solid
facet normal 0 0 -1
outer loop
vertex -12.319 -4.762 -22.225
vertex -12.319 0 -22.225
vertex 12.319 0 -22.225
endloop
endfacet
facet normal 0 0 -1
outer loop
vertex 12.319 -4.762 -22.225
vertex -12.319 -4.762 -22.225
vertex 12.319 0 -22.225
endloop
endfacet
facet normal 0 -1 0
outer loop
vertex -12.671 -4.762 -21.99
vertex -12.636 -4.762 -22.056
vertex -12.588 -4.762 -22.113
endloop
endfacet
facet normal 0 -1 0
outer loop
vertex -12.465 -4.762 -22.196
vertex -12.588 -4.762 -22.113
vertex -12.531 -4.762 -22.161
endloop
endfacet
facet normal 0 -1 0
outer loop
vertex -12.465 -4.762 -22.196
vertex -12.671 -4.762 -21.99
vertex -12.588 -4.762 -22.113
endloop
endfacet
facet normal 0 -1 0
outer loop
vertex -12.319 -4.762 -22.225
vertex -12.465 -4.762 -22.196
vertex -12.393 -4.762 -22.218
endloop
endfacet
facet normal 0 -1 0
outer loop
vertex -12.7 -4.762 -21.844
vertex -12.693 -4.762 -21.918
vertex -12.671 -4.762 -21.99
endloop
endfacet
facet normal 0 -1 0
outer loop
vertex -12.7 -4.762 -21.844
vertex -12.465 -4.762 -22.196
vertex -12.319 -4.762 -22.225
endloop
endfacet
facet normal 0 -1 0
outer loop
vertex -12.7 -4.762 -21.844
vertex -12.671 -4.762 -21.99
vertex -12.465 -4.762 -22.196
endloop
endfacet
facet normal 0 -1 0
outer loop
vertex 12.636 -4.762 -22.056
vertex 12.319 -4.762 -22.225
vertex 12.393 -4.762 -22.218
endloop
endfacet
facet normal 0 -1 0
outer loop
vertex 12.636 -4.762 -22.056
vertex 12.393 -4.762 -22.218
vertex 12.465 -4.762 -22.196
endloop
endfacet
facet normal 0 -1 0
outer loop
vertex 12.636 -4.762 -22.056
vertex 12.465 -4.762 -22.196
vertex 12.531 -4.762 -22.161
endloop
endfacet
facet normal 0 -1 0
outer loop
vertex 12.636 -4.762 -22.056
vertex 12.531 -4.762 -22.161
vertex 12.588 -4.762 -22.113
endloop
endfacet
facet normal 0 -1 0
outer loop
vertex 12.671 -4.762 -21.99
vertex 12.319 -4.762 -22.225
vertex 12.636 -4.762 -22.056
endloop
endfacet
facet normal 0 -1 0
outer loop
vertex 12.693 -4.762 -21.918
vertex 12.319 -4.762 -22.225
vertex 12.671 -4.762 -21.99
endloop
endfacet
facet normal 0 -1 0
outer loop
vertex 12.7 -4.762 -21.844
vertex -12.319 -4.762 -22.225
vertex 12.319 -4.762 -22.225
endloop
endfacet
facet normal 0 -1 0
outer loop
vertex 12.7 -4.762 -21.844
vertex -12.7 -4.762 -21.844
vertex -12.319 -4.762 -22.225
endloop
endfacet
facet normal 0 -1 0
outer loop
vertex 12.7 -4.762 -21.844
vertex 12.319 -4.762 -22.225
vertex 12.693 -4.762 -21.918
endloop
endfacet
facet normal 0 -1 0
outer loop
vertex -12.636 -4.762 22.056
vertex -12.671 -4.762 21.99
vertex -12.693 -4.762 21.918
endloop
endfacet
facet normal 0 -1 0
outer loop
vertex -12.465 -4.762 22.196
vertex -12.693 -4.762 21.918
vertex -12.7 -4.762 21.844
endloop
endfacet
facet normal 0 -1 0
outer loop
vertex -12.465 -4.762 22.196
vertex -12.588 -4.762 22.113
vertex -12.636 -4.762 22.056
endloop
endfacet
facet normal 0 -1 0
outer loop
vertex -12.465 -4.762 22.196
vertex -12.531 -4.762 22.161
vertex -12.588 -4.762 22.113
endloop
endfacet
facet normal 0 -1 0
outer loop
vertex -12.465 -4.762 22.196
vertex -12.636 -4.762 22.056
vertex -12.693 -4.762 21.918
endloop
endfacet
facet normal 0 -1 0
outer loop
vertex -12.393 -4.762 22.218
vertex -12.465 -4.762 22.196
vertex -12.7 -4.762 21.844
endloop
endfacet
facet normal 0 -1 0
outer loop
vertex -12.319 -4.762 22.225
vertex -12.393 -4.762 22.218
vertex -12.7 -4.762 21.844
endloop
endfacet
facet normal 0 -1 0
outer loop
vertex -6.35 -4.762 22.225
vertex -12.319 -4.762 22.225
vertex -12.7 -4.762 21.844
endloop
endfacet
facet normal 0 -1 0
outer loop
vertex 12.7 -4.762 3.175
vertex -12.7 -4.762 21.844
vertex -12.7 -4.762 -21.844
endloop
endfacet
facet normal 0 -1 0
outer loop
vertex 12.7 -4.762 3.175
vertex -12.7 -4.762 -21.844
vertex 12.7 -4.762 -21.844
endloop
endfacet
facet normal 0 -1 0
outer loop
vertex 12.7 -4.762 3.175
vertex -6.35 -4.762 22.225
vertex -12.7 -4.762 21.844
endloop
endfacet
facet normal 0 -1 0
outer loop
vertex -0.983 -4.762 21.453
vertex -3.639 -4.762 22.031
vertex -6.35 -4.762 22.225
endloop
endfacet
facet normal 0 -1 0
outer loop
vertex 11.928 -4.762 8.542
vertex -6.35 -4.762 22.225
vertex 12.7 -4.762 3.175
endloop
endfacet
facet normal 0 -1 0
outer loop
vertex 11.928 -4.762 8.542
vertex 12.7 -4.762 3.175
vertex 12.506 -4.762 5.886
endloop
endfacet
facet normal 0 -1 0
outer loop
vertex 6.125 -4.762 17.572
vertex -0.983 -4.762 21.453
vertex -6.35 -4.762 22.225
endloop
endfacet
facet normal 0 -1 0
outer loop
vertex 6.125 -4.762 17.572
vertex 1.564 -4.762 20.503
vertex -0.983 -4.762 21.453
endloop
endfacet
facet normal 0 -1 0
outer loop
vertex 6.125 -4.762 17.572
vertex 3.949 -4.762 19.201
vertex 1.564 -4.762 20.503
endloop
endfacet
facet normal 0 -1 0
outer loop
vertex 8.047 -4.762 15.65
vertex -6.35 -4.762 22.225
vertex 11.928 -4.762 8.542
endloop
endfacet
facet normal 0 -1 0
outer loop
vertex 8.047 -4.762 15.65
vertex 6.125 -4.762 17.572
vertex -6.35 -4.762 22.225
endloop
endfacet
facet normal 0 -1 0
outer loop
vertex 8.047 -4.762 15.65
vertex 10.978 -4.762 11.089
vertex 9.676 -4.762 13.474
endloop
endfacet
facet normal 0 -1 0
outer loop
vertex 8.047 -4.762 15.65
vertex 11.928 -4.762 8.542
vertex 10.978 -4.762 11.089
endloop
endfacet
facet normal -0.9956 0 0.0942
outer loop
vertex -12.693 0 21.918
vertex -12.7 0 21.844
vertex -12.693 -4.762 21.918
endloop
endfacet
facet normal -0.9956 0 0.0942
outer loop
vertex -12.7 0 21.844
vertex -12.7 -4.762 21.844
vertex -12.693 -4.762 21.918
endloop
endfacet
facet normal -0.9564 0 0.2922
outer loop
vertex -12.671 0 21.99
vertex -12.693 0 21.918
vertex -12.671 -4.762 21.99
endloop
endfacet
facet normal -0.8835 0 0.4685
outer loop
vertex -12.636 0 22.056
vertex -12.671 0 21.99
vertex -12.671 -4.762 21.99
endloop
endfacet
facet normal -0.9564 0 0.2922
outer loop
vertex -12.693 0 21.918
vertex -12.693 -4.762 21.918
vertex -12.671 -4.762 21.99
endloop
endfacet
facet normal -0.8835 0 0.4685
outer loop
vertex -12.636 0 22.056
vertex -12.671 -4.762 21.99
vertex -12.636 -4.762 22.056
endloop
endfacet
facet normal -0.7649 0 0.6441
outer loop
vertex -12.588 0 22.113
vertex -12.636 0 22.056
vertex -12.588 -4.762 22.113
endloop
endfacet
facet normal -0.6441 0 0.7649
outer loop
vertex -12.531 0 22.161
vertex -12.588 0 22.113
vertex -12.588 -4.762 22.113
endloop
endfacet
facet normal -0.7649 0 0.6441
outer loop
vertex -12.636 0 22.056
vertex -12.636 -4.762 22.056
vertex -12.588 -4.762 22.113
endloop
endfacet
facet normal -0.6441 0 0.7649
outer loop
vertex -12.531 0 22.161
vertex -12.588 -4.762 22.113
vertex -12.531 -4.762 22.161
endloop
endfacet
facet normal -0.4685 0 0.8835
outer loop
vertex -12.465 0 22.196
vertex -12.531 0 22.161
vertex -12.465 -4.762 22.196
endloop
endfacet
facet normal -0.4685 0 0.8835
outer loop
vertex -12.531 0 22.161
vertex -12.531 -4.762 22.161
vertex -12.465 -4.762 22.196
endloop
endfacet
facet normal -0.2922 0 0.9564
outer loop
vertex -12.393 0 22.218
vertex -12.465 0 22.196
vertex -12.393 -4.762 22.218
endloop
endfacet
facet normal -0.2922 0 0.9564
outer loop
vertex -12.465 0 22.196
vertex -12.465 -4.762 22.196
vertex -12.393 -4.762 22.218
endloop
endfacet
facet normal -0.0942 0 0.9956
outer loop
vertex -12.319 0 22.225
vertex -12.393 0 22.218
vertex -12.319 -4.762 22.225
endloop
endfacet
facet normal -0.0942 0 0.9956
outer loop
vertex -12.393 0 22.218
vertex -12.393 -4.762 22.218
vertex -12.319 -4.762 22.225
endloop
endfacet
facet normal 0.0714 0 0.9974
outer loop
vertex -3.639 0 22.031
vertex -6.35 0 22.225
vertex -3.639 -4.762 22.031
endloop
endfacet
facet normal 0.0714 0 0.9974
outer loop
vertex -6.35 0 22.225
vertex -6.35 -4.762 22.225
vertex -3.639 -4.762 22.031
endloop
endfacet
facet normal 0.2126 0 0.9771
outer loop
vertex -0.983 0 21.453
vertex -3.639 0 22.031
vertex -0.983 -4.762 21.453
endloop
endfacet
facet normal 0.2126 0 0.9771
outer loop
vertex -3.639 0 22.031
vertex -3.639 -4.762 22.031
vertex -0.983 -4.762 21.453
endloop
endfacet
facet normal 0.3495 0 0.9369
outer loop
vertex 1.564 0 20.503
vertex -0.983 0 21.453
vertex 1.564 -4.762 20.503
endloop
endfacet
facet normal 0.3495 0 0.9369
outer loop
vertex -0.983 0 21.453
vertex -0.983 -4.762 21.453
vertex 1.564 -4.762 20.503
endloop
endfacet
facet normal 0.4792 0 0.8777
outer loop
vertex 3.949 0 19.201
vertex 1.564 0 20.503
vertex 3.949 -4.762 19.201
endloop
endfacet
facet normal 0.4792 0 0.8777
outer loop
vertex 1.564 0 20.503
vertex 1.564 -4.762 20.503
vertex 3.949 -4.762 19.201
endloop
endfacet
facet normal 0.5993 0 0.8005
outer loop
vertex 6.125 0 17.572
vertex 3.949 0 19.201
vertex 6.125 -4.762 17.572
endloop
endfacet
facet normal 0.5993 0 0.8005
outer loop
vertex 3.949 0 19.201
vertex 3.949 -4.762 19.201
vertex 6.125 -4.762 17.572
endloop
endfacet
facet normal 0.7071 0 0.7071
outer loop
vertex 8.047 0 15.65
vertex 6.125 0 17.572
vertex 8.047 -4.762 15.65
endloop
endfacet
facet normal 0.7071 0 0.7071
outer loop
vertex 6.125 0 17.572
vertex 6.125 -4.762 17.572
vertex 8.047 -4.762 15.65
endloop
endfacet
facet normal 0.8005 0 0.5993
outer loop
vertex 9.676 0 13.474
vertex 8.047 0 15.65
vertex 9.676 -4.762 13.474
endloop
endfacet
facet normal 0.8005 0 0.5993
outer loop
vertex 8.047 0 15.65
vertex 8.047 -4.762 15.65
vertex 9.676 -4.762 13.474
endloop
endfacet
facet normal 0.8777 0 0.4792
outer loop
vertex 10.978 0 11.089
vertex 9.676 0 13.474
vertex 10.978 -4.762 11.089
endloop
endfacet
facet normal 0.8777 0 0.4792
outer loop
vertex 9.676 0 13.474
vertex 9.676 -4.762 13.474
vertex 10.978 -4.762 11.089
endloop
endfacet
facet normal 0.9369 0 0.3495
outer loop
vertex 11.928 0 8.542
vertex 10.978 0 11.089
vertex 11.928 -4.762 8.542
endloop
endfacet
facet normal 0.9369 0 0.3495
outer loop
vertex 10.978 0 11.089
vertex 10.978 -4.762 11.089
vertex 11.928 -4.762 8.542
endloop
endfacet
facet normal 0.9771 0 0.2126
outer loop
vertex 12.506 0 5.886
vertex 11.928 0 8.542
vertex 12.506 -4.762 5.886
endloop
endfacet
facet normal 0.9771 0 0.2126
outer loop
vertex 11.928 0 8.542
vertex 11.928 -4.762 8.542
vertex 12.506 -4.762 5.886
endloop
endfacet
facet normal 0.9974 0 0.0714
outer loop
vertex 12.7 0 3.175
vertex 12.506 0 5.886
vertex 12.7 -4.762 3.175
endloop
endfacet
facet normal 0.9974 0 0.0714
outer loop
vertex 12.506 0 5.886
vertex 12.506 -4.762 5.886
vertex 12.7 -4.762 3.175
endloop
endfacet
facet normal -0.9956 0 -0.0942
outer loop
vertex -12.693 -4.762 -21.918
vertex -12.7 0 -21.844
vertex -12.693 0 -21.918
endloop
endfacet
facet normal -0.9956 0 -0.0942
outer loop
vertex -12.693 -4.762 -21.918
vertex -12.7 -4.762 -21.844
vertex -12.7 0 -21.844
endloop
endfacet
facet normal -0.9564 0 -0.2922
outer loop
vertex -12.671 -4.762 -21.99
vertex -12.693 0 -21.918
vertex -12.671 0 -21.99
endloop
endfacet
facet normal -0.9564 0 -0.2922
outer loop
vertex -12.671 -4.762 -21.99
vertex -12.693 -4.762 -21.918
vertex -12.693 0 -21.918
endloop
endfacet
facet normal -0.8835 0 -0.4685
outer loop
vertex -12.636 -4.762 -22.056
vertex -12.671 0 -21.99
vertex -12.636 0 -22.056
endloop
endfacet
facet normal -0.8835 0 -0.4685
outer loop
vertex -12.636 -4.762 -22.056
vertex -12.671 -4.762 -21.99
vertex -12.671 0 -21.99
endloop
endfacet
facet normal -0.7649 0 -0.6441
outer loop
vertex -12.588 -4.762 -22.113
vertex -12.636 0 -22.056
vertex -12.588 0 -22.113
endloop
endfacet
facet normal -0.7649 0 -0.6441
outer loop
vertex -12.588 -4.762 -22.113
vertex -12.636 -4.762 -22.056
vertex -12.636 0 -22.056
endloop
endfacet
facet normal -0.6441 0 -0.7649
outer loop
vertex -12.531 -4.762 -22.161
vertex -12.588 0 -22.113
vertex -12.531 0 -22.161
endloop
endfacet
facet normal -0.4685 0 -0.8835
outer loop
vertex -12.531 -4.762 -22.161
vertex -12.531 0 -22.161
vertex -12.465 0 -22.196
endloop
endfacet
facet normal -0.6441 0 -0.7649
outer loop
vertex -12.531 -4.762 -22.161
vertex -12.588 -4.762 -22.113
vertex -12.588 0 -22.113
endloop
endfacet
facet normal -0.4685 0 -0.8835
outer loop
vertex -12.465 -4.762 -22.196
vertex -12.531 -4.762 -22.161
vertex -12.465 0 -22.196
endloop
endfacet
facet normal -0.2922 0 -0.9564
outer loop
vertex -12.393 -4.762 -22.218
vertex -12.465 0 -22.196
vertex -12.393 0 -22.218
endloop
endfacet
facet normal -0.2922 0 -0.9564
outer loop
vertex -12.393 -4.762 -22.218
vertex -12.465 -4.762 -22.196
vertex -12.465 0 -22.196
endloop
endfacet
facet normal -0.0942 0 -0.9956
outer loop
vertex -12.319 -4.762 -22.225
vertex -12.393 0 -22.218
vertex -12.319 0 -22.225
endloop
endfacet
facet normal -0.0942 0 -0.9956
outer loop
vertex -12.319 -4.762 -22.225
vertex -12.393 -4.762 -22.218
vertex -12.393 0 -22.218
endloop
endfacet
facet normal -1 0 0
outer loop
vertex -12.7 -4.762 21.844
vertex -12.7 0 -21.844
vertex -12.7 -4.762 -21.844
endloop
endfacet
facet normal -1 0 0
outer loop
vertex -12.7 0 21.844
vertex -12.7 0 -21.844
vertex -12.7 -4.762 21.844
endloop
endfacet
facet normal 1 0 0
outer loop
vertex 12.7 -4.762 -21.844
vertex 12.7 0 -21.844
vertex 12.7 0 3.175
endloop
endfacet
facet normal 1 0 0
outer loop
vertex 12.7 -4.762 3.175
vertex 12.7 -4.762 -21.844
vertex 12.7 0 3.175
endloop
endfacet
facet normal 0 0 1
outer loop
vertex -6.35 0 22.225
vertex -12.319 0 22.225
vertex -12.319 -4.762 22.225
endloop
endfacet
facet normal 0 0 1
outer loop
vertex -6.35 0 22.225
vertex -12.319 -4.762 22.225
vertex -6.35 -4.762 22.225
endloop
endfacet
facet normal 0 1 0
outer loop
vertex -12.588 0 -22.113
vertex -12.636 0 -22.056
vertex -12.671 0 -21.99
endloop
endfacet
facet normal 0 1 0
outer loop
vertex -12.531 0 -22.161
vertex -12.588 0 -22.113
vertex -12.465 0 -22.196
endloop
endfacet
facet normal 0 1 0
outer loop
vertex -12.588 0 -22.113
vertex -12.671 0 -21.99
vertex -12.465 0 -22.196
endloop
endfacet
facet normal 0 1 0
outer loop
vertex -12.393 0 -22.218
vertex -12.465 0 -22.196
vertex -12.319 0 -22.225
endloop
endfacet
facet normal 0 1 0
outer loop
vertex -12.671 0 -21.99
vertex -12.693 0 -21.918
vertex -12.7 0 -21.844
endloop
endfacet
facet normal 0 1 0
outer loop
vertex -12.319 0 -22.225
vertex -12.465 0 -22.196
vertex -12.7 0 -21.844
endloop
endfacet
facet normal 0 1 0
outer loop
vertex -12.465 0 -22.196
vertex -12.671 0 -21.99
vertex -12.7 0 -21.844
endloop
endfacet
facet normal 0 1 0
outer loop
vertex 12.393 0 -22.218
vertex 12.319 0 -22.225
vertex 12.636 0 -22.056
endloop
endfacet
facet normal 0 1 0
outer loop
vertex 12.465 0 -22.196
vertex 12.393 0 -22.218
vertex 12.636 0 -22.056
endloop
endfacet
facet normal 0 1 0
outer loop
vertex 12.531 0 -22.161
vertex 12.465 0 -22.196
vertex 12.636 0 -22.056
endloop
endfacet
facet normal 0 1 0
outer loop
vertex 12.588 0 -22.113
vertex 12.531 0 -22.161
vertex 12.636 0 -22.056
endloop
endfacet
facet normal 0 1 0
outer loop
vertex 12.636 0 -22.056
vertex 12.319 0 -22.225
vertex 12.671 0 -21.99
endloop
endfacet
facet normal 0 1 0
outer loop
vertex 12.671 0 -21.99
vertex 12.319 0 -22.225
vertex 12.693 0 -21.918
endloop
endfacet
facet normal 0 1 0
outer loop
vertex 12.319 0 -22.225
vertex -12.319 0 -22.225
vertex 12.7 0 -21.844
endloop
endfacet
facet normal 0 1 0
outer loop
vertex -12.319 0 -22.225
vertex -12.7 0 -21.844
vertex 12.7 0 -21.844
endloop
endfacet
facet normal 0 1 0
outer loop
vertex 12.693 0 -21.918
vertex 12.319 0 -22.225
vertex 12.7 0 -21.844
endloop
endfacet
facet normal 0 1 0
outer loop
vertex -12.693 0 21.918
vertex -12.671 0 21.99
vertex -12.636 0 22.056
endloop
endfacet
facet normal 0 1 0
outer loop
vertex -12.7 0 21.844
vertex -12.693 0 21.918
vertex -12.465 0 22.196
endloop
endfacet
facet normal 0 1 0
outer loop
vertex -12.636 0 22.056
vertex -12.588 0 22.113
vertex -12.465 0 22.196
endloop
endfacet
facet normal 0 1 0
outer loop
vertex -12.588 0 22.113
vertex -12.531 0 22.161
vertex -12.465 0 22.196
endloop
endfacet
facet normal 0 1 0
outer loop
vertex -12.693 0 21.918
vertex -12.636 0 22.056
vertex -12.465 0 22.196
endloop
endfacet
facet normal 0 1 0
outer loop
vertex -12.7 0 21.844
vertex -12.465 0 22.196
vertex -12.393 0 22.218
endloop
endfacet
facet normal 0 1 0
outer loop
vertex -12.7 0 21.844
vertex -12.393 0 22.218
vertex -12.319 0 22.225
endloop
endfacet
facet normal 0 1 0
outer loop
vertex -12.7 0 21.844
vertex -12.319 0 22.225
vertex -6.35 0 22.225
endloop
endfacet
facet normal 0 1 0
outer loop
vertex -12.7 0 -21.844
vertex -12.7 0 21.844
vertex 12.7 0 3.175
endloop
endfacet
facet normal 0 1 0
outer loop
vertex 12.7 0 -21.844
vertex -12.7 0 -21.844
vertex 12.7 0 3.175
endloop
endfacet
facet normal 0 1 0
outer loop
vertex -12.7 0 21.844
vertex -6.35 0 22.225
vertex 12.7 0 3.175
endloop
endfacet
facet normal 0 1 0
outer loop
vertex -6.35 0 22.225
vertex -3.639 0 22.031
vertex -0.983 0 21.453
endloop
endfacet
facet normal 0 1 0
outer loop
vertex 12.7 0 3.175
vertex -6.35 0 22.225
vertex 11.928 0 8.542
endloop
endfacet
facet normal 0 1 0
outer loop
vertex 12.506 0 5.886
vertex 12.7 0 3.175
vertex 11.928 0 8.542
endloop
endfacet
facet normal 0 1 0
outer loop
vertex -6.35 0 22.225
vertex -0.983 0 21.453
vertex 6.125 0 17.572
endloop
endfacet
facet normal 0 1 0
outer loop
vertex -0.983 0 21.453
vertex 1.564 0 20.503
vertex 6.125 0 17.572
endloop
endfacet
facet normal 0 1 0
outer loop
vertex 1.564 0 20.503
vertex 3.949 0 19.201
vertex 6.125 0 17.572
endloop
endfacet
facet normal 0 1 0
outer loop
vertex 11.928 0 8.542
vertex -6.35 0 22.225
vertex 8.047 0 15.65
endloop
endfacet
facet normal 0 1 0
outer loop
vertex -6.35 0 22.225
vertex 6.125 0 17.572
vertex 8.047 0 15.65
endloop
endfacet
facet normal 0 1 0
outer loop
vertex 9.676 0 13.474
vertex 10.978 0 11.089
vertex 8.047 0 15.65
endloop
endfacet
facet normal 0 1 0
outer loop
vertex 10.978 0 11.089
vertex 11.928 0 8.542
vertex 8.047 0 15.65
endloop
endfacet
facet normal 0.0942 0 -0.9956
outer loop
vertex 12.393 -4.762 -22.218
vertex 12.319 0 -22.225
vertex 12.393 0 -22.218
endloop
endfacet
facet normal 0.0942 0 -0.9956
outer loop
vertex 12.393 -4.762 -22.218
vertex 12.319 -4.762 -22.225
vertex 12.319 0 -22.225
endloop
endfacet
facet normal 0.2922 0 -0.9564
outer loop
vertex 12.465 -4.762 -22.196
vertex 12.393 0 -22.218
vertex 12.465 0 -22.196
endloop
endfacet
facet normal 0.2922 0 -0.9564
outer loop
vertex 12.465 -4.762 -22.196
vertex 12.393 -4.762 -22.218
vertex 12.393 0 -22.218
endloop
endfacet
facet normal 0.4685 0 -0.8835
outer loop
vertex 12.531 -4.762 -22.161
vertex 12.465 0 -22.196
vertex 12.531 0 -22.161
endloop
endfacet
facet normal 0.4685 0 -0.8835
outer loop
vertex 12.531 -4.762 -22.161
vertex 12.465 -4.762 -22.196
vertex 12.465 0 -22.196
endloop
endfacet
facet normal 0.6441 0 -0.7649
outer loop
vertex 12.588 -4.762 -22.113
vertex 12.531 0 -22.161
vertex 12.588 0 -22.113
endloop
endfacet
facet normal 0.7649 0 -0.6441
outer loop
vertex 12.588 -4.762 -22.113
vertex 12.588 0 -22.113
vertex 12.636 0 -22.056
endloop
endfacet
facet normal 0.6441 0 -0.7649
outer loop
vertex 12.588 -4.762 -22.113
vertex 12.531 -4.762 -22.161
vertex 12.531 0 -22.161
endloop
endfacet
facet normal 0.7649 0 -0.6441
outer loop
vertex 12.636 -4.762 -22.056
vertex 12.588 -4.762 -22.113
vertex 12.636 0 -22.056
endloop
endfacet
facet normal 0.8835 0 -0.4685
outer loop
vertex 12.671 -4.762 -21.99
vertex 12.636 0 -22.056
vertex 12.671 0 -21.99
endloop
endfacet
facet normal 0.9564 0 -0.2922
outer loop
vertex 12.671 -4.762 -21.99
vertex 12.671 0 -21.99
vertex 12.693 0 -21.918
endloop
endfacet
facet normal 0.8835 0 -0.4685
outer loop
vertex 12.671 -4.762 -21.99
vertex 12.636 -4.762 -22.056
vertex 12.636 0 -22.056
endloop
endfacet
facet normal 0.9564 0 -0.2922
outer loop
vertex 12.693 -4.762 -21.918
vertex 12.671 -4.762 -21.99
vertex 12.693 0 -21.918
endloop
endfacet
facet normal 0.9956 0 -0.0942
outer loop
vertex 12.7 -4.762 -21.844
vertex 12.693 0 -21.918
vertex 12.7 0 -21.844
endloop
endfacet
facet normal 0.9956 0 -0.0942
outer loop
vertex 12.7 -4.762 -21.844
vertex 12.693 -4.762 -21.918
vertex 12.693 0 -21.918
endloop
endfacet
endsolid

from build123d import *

# Parameters (mm, degrees)
F0_W     = 25.4
F0_H     = 44.45
F1_DEPTH = 4.7625
F2_R     = 0.381
F3_R     = 19.05


with BuildPart() as f1:
    # F0 (on Front) → F1 (new body)
    with BuildSketch(Plane.XZ):
        Rectangle(F0_W, F0_H)
    extrude(amount=F1_DEPTH)

    # F2
    f2_edges = [f1.edges().sort_by_distance(p)[0] for p in [
        (-12.7, -2.38125, -22.225),
        (12.7, -2.38125, -22.225),
        (-12.7, -2.38125, 22.225),
    ]]
    fillet(f2_edges, radius=F2_R)

    # F3
    f3_edges = [f1.edges().sort_by_distance(p)[0] for p in [
        (12.7, -2.38125, 22.225),
    ]]
    fillet(f3_edges, radius=F3_R)


solid = f1.part
